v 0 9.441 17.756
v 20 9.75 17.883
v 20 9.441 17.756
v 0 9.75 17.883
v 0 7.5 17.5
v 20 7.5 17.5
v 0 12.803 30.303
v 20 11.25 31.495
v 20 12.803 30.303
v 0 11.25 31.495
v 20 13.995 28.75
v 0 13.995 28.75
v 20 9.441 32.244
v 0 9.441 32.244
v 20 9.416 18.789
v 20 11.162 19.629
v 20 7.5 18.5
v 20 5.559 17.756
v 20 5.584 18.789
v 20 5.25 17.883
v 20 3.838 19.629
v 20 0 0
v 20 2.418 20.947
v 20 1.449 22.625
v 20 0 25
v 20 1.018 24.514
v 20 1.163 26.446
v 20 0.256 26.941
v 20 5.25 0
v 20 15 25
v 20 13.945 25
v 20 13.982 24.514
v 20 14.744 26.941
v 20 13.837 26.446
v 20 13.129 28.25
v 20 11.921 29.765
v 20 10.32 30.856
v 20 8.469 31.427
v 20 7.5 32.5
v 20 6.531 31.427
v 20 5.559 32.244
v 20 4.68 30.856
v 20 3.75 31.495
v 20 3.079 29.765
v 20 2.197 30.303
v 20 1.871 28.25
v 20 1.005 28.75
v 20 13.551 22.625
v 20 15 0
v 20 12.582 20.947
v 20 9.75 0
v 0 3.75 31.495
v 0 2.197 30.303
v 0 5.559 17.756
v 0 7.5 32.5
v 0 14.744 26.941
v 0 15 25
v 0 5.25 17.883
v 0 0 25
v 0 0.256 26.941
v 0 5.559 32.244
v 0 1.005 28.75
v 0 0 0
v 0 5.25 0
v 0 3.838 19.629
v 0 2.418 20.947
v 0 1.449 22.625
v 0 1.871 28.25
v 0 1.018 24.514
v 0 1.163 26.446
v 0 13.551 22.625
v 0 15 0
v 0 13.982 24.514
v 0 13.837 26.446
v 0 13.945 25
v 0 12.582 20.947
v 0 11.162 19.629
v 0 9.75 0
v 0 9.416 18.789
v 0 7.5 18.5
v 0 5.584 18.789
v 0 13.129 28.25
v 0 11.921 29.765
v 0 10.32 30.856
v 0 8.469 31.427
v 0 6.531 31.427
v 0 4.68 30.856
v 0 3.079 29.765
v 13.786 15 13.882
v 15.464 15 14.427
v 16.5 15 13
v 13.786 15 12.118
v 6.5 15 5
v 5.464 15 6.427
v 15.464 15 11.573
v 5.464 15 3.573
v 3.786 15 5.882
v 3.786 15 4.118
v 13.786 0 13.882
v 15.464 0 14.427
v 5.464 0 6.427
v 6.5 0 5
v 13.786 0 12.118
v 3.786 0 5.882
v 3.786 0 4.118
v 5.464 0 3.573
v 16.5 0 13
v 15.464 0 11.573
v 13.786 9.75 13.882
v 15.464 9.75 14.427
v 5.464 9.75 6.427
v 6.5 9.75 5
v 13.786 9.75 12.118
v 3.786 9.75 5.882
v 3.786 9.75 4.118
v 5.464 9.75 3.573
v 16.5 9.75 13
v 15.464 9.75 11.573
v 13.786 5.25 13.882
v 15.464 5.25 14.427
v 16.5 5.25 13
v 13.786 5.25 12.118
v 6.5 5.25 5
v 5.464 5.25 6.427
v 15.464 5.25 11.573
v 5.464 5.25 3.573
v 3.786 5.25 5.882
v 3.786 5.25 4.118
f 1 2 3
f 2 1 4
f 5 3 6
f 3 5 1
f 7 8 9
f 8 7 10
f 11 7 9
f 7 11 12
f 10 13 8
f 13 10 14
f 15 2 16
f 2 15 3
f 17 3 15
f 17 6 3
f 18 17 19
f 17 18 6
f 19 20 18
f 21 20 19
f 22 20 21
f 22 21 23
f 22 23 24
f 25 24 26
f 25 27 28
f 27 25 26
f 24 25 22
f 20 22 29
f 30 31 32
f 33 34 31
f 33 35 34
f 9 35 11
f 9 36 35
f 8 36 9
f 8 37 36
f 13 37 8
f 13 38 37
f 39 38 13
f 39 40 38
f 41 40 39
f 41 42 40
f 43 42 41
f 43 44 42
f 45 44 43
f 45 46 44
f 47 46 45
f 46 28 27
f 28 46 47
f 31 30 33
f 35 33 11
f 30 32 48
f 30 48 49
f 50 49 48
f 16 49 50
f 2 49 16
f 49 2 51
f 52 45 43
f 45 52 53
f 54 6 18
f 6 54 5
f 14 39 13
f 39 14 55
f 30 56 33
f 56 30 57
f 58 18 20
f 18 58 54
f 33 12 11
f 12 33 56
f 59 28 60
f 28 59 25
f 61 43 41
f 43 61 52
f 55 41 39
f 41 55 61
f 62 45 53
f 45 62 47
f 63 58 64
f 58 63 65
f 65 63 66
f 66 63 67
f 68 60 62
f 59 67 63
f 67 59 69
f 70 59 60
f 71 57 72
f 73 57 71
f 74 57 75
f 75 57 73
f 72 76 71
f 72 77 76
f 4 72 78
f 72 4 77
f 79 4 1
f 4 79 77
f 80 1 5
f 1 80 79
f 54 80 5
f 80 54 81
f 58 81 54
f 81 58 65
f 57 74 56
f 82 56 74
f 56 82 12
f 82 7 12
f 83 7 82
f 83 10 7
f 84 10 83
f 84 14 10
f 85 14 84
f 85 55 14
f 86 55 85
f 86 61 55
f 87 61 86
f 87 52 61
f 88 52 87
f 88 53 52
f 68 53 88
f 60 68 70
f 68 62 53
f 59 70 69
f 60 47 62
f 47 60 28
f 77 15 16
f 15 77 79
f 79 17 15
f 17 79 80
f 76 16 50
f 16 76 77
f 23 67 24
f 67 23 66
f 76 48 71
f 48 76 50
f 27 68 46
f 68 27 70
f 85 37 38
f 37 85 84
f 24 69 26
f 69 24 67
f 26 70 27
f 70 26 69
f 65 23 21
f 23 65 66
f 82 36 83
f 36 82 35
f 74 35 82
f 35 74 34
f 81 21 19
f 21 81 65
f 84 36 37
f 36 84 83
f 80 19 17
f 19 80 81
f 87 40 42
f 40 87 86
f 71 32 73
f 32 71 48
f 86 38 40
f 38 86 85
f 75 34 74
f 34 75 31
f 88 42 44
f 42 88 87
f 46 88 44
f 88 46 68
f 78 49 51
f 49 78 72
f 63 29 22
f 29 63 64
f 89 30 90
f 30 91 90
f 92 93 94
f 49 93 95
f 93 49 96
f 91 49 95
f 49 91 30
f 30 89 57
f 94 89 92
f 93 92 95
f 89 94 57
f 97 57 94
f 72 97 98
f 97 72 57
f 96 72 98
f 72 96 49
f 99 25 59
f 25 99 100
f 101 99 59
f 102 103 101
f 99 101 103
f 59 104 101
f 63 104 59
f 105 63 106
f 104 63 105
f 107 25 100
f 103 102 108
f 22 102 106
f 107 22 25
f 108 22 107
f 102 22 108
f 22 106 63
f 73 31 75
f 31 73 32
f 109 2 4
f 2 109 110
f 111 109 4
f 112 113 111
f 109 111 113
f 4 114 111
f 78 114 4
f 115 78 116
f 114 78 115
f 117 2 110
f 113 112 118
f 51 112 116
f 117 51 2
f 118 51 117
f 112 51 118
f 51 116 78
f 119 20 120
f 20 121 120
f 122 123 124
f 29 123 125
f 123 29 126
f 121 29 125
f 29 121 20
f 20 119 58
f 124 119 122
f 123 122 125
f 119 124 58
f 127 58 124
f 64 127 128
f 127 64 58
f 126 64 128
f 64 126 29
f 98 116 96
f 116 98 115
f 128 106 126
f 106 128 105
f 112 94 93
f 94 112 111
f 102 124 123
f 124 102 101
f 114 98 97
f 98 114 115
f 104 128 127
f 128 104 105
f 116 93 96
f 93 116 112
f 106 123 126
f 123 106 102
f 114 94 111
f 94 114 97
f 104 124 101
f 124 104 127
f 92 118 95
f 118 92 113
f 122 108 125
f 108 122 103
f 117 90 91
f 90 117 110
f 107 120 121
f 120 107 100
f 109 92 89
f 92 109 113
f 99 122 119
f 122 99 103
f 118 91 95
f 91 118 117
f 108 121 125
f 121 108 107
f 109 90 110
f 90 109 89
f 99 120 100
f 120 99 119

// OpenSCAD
translate([0,7.5,25]) {
    rotate([0,90,0]) {
        difference() {
            cylinder(20, 7.5, 7.5);
            translate([0,0,-1]) {cylinder(30, 6.5, 6.5);}
        }
    }
}
difference() {
    cube([20,15,25]);
    translate([0,7.5,25]) {
        rotate([0,90,0]) {
            translate([0,0,-1]) {cylinder(30, 6.5, 6.5);}
        }
    }
    translate([-0.1,5.25,-0.1]) {
    cube([21,4.5,26]);
    }
    translate([5,0,5]) {
        rotate([90,0,0]) {
            cylinder(33, 1.5, 1.5, true);
        }
    }
    translate([15,0,13]) {
        rotate([90,0,0]) {
            cylinder(33, 1.5, 1.5, true);
        }
    }
}
/*
module drillPressBracket() {





}

cylinder(17, 4.5, 4.5, true); //12 mil longer (so cylinder is 6 longer here)
}


}
translate([-1,20,-1]) { cube([16,22,22]); }
translate([35,20,-1]) { cube([16,22,22]); }
}}}

translate([25,0,0]) { drillPressBracket(); }
color([255,0,0]) {
translate([17,-50,45]) {  { NutHolder(); }}
}
*/
